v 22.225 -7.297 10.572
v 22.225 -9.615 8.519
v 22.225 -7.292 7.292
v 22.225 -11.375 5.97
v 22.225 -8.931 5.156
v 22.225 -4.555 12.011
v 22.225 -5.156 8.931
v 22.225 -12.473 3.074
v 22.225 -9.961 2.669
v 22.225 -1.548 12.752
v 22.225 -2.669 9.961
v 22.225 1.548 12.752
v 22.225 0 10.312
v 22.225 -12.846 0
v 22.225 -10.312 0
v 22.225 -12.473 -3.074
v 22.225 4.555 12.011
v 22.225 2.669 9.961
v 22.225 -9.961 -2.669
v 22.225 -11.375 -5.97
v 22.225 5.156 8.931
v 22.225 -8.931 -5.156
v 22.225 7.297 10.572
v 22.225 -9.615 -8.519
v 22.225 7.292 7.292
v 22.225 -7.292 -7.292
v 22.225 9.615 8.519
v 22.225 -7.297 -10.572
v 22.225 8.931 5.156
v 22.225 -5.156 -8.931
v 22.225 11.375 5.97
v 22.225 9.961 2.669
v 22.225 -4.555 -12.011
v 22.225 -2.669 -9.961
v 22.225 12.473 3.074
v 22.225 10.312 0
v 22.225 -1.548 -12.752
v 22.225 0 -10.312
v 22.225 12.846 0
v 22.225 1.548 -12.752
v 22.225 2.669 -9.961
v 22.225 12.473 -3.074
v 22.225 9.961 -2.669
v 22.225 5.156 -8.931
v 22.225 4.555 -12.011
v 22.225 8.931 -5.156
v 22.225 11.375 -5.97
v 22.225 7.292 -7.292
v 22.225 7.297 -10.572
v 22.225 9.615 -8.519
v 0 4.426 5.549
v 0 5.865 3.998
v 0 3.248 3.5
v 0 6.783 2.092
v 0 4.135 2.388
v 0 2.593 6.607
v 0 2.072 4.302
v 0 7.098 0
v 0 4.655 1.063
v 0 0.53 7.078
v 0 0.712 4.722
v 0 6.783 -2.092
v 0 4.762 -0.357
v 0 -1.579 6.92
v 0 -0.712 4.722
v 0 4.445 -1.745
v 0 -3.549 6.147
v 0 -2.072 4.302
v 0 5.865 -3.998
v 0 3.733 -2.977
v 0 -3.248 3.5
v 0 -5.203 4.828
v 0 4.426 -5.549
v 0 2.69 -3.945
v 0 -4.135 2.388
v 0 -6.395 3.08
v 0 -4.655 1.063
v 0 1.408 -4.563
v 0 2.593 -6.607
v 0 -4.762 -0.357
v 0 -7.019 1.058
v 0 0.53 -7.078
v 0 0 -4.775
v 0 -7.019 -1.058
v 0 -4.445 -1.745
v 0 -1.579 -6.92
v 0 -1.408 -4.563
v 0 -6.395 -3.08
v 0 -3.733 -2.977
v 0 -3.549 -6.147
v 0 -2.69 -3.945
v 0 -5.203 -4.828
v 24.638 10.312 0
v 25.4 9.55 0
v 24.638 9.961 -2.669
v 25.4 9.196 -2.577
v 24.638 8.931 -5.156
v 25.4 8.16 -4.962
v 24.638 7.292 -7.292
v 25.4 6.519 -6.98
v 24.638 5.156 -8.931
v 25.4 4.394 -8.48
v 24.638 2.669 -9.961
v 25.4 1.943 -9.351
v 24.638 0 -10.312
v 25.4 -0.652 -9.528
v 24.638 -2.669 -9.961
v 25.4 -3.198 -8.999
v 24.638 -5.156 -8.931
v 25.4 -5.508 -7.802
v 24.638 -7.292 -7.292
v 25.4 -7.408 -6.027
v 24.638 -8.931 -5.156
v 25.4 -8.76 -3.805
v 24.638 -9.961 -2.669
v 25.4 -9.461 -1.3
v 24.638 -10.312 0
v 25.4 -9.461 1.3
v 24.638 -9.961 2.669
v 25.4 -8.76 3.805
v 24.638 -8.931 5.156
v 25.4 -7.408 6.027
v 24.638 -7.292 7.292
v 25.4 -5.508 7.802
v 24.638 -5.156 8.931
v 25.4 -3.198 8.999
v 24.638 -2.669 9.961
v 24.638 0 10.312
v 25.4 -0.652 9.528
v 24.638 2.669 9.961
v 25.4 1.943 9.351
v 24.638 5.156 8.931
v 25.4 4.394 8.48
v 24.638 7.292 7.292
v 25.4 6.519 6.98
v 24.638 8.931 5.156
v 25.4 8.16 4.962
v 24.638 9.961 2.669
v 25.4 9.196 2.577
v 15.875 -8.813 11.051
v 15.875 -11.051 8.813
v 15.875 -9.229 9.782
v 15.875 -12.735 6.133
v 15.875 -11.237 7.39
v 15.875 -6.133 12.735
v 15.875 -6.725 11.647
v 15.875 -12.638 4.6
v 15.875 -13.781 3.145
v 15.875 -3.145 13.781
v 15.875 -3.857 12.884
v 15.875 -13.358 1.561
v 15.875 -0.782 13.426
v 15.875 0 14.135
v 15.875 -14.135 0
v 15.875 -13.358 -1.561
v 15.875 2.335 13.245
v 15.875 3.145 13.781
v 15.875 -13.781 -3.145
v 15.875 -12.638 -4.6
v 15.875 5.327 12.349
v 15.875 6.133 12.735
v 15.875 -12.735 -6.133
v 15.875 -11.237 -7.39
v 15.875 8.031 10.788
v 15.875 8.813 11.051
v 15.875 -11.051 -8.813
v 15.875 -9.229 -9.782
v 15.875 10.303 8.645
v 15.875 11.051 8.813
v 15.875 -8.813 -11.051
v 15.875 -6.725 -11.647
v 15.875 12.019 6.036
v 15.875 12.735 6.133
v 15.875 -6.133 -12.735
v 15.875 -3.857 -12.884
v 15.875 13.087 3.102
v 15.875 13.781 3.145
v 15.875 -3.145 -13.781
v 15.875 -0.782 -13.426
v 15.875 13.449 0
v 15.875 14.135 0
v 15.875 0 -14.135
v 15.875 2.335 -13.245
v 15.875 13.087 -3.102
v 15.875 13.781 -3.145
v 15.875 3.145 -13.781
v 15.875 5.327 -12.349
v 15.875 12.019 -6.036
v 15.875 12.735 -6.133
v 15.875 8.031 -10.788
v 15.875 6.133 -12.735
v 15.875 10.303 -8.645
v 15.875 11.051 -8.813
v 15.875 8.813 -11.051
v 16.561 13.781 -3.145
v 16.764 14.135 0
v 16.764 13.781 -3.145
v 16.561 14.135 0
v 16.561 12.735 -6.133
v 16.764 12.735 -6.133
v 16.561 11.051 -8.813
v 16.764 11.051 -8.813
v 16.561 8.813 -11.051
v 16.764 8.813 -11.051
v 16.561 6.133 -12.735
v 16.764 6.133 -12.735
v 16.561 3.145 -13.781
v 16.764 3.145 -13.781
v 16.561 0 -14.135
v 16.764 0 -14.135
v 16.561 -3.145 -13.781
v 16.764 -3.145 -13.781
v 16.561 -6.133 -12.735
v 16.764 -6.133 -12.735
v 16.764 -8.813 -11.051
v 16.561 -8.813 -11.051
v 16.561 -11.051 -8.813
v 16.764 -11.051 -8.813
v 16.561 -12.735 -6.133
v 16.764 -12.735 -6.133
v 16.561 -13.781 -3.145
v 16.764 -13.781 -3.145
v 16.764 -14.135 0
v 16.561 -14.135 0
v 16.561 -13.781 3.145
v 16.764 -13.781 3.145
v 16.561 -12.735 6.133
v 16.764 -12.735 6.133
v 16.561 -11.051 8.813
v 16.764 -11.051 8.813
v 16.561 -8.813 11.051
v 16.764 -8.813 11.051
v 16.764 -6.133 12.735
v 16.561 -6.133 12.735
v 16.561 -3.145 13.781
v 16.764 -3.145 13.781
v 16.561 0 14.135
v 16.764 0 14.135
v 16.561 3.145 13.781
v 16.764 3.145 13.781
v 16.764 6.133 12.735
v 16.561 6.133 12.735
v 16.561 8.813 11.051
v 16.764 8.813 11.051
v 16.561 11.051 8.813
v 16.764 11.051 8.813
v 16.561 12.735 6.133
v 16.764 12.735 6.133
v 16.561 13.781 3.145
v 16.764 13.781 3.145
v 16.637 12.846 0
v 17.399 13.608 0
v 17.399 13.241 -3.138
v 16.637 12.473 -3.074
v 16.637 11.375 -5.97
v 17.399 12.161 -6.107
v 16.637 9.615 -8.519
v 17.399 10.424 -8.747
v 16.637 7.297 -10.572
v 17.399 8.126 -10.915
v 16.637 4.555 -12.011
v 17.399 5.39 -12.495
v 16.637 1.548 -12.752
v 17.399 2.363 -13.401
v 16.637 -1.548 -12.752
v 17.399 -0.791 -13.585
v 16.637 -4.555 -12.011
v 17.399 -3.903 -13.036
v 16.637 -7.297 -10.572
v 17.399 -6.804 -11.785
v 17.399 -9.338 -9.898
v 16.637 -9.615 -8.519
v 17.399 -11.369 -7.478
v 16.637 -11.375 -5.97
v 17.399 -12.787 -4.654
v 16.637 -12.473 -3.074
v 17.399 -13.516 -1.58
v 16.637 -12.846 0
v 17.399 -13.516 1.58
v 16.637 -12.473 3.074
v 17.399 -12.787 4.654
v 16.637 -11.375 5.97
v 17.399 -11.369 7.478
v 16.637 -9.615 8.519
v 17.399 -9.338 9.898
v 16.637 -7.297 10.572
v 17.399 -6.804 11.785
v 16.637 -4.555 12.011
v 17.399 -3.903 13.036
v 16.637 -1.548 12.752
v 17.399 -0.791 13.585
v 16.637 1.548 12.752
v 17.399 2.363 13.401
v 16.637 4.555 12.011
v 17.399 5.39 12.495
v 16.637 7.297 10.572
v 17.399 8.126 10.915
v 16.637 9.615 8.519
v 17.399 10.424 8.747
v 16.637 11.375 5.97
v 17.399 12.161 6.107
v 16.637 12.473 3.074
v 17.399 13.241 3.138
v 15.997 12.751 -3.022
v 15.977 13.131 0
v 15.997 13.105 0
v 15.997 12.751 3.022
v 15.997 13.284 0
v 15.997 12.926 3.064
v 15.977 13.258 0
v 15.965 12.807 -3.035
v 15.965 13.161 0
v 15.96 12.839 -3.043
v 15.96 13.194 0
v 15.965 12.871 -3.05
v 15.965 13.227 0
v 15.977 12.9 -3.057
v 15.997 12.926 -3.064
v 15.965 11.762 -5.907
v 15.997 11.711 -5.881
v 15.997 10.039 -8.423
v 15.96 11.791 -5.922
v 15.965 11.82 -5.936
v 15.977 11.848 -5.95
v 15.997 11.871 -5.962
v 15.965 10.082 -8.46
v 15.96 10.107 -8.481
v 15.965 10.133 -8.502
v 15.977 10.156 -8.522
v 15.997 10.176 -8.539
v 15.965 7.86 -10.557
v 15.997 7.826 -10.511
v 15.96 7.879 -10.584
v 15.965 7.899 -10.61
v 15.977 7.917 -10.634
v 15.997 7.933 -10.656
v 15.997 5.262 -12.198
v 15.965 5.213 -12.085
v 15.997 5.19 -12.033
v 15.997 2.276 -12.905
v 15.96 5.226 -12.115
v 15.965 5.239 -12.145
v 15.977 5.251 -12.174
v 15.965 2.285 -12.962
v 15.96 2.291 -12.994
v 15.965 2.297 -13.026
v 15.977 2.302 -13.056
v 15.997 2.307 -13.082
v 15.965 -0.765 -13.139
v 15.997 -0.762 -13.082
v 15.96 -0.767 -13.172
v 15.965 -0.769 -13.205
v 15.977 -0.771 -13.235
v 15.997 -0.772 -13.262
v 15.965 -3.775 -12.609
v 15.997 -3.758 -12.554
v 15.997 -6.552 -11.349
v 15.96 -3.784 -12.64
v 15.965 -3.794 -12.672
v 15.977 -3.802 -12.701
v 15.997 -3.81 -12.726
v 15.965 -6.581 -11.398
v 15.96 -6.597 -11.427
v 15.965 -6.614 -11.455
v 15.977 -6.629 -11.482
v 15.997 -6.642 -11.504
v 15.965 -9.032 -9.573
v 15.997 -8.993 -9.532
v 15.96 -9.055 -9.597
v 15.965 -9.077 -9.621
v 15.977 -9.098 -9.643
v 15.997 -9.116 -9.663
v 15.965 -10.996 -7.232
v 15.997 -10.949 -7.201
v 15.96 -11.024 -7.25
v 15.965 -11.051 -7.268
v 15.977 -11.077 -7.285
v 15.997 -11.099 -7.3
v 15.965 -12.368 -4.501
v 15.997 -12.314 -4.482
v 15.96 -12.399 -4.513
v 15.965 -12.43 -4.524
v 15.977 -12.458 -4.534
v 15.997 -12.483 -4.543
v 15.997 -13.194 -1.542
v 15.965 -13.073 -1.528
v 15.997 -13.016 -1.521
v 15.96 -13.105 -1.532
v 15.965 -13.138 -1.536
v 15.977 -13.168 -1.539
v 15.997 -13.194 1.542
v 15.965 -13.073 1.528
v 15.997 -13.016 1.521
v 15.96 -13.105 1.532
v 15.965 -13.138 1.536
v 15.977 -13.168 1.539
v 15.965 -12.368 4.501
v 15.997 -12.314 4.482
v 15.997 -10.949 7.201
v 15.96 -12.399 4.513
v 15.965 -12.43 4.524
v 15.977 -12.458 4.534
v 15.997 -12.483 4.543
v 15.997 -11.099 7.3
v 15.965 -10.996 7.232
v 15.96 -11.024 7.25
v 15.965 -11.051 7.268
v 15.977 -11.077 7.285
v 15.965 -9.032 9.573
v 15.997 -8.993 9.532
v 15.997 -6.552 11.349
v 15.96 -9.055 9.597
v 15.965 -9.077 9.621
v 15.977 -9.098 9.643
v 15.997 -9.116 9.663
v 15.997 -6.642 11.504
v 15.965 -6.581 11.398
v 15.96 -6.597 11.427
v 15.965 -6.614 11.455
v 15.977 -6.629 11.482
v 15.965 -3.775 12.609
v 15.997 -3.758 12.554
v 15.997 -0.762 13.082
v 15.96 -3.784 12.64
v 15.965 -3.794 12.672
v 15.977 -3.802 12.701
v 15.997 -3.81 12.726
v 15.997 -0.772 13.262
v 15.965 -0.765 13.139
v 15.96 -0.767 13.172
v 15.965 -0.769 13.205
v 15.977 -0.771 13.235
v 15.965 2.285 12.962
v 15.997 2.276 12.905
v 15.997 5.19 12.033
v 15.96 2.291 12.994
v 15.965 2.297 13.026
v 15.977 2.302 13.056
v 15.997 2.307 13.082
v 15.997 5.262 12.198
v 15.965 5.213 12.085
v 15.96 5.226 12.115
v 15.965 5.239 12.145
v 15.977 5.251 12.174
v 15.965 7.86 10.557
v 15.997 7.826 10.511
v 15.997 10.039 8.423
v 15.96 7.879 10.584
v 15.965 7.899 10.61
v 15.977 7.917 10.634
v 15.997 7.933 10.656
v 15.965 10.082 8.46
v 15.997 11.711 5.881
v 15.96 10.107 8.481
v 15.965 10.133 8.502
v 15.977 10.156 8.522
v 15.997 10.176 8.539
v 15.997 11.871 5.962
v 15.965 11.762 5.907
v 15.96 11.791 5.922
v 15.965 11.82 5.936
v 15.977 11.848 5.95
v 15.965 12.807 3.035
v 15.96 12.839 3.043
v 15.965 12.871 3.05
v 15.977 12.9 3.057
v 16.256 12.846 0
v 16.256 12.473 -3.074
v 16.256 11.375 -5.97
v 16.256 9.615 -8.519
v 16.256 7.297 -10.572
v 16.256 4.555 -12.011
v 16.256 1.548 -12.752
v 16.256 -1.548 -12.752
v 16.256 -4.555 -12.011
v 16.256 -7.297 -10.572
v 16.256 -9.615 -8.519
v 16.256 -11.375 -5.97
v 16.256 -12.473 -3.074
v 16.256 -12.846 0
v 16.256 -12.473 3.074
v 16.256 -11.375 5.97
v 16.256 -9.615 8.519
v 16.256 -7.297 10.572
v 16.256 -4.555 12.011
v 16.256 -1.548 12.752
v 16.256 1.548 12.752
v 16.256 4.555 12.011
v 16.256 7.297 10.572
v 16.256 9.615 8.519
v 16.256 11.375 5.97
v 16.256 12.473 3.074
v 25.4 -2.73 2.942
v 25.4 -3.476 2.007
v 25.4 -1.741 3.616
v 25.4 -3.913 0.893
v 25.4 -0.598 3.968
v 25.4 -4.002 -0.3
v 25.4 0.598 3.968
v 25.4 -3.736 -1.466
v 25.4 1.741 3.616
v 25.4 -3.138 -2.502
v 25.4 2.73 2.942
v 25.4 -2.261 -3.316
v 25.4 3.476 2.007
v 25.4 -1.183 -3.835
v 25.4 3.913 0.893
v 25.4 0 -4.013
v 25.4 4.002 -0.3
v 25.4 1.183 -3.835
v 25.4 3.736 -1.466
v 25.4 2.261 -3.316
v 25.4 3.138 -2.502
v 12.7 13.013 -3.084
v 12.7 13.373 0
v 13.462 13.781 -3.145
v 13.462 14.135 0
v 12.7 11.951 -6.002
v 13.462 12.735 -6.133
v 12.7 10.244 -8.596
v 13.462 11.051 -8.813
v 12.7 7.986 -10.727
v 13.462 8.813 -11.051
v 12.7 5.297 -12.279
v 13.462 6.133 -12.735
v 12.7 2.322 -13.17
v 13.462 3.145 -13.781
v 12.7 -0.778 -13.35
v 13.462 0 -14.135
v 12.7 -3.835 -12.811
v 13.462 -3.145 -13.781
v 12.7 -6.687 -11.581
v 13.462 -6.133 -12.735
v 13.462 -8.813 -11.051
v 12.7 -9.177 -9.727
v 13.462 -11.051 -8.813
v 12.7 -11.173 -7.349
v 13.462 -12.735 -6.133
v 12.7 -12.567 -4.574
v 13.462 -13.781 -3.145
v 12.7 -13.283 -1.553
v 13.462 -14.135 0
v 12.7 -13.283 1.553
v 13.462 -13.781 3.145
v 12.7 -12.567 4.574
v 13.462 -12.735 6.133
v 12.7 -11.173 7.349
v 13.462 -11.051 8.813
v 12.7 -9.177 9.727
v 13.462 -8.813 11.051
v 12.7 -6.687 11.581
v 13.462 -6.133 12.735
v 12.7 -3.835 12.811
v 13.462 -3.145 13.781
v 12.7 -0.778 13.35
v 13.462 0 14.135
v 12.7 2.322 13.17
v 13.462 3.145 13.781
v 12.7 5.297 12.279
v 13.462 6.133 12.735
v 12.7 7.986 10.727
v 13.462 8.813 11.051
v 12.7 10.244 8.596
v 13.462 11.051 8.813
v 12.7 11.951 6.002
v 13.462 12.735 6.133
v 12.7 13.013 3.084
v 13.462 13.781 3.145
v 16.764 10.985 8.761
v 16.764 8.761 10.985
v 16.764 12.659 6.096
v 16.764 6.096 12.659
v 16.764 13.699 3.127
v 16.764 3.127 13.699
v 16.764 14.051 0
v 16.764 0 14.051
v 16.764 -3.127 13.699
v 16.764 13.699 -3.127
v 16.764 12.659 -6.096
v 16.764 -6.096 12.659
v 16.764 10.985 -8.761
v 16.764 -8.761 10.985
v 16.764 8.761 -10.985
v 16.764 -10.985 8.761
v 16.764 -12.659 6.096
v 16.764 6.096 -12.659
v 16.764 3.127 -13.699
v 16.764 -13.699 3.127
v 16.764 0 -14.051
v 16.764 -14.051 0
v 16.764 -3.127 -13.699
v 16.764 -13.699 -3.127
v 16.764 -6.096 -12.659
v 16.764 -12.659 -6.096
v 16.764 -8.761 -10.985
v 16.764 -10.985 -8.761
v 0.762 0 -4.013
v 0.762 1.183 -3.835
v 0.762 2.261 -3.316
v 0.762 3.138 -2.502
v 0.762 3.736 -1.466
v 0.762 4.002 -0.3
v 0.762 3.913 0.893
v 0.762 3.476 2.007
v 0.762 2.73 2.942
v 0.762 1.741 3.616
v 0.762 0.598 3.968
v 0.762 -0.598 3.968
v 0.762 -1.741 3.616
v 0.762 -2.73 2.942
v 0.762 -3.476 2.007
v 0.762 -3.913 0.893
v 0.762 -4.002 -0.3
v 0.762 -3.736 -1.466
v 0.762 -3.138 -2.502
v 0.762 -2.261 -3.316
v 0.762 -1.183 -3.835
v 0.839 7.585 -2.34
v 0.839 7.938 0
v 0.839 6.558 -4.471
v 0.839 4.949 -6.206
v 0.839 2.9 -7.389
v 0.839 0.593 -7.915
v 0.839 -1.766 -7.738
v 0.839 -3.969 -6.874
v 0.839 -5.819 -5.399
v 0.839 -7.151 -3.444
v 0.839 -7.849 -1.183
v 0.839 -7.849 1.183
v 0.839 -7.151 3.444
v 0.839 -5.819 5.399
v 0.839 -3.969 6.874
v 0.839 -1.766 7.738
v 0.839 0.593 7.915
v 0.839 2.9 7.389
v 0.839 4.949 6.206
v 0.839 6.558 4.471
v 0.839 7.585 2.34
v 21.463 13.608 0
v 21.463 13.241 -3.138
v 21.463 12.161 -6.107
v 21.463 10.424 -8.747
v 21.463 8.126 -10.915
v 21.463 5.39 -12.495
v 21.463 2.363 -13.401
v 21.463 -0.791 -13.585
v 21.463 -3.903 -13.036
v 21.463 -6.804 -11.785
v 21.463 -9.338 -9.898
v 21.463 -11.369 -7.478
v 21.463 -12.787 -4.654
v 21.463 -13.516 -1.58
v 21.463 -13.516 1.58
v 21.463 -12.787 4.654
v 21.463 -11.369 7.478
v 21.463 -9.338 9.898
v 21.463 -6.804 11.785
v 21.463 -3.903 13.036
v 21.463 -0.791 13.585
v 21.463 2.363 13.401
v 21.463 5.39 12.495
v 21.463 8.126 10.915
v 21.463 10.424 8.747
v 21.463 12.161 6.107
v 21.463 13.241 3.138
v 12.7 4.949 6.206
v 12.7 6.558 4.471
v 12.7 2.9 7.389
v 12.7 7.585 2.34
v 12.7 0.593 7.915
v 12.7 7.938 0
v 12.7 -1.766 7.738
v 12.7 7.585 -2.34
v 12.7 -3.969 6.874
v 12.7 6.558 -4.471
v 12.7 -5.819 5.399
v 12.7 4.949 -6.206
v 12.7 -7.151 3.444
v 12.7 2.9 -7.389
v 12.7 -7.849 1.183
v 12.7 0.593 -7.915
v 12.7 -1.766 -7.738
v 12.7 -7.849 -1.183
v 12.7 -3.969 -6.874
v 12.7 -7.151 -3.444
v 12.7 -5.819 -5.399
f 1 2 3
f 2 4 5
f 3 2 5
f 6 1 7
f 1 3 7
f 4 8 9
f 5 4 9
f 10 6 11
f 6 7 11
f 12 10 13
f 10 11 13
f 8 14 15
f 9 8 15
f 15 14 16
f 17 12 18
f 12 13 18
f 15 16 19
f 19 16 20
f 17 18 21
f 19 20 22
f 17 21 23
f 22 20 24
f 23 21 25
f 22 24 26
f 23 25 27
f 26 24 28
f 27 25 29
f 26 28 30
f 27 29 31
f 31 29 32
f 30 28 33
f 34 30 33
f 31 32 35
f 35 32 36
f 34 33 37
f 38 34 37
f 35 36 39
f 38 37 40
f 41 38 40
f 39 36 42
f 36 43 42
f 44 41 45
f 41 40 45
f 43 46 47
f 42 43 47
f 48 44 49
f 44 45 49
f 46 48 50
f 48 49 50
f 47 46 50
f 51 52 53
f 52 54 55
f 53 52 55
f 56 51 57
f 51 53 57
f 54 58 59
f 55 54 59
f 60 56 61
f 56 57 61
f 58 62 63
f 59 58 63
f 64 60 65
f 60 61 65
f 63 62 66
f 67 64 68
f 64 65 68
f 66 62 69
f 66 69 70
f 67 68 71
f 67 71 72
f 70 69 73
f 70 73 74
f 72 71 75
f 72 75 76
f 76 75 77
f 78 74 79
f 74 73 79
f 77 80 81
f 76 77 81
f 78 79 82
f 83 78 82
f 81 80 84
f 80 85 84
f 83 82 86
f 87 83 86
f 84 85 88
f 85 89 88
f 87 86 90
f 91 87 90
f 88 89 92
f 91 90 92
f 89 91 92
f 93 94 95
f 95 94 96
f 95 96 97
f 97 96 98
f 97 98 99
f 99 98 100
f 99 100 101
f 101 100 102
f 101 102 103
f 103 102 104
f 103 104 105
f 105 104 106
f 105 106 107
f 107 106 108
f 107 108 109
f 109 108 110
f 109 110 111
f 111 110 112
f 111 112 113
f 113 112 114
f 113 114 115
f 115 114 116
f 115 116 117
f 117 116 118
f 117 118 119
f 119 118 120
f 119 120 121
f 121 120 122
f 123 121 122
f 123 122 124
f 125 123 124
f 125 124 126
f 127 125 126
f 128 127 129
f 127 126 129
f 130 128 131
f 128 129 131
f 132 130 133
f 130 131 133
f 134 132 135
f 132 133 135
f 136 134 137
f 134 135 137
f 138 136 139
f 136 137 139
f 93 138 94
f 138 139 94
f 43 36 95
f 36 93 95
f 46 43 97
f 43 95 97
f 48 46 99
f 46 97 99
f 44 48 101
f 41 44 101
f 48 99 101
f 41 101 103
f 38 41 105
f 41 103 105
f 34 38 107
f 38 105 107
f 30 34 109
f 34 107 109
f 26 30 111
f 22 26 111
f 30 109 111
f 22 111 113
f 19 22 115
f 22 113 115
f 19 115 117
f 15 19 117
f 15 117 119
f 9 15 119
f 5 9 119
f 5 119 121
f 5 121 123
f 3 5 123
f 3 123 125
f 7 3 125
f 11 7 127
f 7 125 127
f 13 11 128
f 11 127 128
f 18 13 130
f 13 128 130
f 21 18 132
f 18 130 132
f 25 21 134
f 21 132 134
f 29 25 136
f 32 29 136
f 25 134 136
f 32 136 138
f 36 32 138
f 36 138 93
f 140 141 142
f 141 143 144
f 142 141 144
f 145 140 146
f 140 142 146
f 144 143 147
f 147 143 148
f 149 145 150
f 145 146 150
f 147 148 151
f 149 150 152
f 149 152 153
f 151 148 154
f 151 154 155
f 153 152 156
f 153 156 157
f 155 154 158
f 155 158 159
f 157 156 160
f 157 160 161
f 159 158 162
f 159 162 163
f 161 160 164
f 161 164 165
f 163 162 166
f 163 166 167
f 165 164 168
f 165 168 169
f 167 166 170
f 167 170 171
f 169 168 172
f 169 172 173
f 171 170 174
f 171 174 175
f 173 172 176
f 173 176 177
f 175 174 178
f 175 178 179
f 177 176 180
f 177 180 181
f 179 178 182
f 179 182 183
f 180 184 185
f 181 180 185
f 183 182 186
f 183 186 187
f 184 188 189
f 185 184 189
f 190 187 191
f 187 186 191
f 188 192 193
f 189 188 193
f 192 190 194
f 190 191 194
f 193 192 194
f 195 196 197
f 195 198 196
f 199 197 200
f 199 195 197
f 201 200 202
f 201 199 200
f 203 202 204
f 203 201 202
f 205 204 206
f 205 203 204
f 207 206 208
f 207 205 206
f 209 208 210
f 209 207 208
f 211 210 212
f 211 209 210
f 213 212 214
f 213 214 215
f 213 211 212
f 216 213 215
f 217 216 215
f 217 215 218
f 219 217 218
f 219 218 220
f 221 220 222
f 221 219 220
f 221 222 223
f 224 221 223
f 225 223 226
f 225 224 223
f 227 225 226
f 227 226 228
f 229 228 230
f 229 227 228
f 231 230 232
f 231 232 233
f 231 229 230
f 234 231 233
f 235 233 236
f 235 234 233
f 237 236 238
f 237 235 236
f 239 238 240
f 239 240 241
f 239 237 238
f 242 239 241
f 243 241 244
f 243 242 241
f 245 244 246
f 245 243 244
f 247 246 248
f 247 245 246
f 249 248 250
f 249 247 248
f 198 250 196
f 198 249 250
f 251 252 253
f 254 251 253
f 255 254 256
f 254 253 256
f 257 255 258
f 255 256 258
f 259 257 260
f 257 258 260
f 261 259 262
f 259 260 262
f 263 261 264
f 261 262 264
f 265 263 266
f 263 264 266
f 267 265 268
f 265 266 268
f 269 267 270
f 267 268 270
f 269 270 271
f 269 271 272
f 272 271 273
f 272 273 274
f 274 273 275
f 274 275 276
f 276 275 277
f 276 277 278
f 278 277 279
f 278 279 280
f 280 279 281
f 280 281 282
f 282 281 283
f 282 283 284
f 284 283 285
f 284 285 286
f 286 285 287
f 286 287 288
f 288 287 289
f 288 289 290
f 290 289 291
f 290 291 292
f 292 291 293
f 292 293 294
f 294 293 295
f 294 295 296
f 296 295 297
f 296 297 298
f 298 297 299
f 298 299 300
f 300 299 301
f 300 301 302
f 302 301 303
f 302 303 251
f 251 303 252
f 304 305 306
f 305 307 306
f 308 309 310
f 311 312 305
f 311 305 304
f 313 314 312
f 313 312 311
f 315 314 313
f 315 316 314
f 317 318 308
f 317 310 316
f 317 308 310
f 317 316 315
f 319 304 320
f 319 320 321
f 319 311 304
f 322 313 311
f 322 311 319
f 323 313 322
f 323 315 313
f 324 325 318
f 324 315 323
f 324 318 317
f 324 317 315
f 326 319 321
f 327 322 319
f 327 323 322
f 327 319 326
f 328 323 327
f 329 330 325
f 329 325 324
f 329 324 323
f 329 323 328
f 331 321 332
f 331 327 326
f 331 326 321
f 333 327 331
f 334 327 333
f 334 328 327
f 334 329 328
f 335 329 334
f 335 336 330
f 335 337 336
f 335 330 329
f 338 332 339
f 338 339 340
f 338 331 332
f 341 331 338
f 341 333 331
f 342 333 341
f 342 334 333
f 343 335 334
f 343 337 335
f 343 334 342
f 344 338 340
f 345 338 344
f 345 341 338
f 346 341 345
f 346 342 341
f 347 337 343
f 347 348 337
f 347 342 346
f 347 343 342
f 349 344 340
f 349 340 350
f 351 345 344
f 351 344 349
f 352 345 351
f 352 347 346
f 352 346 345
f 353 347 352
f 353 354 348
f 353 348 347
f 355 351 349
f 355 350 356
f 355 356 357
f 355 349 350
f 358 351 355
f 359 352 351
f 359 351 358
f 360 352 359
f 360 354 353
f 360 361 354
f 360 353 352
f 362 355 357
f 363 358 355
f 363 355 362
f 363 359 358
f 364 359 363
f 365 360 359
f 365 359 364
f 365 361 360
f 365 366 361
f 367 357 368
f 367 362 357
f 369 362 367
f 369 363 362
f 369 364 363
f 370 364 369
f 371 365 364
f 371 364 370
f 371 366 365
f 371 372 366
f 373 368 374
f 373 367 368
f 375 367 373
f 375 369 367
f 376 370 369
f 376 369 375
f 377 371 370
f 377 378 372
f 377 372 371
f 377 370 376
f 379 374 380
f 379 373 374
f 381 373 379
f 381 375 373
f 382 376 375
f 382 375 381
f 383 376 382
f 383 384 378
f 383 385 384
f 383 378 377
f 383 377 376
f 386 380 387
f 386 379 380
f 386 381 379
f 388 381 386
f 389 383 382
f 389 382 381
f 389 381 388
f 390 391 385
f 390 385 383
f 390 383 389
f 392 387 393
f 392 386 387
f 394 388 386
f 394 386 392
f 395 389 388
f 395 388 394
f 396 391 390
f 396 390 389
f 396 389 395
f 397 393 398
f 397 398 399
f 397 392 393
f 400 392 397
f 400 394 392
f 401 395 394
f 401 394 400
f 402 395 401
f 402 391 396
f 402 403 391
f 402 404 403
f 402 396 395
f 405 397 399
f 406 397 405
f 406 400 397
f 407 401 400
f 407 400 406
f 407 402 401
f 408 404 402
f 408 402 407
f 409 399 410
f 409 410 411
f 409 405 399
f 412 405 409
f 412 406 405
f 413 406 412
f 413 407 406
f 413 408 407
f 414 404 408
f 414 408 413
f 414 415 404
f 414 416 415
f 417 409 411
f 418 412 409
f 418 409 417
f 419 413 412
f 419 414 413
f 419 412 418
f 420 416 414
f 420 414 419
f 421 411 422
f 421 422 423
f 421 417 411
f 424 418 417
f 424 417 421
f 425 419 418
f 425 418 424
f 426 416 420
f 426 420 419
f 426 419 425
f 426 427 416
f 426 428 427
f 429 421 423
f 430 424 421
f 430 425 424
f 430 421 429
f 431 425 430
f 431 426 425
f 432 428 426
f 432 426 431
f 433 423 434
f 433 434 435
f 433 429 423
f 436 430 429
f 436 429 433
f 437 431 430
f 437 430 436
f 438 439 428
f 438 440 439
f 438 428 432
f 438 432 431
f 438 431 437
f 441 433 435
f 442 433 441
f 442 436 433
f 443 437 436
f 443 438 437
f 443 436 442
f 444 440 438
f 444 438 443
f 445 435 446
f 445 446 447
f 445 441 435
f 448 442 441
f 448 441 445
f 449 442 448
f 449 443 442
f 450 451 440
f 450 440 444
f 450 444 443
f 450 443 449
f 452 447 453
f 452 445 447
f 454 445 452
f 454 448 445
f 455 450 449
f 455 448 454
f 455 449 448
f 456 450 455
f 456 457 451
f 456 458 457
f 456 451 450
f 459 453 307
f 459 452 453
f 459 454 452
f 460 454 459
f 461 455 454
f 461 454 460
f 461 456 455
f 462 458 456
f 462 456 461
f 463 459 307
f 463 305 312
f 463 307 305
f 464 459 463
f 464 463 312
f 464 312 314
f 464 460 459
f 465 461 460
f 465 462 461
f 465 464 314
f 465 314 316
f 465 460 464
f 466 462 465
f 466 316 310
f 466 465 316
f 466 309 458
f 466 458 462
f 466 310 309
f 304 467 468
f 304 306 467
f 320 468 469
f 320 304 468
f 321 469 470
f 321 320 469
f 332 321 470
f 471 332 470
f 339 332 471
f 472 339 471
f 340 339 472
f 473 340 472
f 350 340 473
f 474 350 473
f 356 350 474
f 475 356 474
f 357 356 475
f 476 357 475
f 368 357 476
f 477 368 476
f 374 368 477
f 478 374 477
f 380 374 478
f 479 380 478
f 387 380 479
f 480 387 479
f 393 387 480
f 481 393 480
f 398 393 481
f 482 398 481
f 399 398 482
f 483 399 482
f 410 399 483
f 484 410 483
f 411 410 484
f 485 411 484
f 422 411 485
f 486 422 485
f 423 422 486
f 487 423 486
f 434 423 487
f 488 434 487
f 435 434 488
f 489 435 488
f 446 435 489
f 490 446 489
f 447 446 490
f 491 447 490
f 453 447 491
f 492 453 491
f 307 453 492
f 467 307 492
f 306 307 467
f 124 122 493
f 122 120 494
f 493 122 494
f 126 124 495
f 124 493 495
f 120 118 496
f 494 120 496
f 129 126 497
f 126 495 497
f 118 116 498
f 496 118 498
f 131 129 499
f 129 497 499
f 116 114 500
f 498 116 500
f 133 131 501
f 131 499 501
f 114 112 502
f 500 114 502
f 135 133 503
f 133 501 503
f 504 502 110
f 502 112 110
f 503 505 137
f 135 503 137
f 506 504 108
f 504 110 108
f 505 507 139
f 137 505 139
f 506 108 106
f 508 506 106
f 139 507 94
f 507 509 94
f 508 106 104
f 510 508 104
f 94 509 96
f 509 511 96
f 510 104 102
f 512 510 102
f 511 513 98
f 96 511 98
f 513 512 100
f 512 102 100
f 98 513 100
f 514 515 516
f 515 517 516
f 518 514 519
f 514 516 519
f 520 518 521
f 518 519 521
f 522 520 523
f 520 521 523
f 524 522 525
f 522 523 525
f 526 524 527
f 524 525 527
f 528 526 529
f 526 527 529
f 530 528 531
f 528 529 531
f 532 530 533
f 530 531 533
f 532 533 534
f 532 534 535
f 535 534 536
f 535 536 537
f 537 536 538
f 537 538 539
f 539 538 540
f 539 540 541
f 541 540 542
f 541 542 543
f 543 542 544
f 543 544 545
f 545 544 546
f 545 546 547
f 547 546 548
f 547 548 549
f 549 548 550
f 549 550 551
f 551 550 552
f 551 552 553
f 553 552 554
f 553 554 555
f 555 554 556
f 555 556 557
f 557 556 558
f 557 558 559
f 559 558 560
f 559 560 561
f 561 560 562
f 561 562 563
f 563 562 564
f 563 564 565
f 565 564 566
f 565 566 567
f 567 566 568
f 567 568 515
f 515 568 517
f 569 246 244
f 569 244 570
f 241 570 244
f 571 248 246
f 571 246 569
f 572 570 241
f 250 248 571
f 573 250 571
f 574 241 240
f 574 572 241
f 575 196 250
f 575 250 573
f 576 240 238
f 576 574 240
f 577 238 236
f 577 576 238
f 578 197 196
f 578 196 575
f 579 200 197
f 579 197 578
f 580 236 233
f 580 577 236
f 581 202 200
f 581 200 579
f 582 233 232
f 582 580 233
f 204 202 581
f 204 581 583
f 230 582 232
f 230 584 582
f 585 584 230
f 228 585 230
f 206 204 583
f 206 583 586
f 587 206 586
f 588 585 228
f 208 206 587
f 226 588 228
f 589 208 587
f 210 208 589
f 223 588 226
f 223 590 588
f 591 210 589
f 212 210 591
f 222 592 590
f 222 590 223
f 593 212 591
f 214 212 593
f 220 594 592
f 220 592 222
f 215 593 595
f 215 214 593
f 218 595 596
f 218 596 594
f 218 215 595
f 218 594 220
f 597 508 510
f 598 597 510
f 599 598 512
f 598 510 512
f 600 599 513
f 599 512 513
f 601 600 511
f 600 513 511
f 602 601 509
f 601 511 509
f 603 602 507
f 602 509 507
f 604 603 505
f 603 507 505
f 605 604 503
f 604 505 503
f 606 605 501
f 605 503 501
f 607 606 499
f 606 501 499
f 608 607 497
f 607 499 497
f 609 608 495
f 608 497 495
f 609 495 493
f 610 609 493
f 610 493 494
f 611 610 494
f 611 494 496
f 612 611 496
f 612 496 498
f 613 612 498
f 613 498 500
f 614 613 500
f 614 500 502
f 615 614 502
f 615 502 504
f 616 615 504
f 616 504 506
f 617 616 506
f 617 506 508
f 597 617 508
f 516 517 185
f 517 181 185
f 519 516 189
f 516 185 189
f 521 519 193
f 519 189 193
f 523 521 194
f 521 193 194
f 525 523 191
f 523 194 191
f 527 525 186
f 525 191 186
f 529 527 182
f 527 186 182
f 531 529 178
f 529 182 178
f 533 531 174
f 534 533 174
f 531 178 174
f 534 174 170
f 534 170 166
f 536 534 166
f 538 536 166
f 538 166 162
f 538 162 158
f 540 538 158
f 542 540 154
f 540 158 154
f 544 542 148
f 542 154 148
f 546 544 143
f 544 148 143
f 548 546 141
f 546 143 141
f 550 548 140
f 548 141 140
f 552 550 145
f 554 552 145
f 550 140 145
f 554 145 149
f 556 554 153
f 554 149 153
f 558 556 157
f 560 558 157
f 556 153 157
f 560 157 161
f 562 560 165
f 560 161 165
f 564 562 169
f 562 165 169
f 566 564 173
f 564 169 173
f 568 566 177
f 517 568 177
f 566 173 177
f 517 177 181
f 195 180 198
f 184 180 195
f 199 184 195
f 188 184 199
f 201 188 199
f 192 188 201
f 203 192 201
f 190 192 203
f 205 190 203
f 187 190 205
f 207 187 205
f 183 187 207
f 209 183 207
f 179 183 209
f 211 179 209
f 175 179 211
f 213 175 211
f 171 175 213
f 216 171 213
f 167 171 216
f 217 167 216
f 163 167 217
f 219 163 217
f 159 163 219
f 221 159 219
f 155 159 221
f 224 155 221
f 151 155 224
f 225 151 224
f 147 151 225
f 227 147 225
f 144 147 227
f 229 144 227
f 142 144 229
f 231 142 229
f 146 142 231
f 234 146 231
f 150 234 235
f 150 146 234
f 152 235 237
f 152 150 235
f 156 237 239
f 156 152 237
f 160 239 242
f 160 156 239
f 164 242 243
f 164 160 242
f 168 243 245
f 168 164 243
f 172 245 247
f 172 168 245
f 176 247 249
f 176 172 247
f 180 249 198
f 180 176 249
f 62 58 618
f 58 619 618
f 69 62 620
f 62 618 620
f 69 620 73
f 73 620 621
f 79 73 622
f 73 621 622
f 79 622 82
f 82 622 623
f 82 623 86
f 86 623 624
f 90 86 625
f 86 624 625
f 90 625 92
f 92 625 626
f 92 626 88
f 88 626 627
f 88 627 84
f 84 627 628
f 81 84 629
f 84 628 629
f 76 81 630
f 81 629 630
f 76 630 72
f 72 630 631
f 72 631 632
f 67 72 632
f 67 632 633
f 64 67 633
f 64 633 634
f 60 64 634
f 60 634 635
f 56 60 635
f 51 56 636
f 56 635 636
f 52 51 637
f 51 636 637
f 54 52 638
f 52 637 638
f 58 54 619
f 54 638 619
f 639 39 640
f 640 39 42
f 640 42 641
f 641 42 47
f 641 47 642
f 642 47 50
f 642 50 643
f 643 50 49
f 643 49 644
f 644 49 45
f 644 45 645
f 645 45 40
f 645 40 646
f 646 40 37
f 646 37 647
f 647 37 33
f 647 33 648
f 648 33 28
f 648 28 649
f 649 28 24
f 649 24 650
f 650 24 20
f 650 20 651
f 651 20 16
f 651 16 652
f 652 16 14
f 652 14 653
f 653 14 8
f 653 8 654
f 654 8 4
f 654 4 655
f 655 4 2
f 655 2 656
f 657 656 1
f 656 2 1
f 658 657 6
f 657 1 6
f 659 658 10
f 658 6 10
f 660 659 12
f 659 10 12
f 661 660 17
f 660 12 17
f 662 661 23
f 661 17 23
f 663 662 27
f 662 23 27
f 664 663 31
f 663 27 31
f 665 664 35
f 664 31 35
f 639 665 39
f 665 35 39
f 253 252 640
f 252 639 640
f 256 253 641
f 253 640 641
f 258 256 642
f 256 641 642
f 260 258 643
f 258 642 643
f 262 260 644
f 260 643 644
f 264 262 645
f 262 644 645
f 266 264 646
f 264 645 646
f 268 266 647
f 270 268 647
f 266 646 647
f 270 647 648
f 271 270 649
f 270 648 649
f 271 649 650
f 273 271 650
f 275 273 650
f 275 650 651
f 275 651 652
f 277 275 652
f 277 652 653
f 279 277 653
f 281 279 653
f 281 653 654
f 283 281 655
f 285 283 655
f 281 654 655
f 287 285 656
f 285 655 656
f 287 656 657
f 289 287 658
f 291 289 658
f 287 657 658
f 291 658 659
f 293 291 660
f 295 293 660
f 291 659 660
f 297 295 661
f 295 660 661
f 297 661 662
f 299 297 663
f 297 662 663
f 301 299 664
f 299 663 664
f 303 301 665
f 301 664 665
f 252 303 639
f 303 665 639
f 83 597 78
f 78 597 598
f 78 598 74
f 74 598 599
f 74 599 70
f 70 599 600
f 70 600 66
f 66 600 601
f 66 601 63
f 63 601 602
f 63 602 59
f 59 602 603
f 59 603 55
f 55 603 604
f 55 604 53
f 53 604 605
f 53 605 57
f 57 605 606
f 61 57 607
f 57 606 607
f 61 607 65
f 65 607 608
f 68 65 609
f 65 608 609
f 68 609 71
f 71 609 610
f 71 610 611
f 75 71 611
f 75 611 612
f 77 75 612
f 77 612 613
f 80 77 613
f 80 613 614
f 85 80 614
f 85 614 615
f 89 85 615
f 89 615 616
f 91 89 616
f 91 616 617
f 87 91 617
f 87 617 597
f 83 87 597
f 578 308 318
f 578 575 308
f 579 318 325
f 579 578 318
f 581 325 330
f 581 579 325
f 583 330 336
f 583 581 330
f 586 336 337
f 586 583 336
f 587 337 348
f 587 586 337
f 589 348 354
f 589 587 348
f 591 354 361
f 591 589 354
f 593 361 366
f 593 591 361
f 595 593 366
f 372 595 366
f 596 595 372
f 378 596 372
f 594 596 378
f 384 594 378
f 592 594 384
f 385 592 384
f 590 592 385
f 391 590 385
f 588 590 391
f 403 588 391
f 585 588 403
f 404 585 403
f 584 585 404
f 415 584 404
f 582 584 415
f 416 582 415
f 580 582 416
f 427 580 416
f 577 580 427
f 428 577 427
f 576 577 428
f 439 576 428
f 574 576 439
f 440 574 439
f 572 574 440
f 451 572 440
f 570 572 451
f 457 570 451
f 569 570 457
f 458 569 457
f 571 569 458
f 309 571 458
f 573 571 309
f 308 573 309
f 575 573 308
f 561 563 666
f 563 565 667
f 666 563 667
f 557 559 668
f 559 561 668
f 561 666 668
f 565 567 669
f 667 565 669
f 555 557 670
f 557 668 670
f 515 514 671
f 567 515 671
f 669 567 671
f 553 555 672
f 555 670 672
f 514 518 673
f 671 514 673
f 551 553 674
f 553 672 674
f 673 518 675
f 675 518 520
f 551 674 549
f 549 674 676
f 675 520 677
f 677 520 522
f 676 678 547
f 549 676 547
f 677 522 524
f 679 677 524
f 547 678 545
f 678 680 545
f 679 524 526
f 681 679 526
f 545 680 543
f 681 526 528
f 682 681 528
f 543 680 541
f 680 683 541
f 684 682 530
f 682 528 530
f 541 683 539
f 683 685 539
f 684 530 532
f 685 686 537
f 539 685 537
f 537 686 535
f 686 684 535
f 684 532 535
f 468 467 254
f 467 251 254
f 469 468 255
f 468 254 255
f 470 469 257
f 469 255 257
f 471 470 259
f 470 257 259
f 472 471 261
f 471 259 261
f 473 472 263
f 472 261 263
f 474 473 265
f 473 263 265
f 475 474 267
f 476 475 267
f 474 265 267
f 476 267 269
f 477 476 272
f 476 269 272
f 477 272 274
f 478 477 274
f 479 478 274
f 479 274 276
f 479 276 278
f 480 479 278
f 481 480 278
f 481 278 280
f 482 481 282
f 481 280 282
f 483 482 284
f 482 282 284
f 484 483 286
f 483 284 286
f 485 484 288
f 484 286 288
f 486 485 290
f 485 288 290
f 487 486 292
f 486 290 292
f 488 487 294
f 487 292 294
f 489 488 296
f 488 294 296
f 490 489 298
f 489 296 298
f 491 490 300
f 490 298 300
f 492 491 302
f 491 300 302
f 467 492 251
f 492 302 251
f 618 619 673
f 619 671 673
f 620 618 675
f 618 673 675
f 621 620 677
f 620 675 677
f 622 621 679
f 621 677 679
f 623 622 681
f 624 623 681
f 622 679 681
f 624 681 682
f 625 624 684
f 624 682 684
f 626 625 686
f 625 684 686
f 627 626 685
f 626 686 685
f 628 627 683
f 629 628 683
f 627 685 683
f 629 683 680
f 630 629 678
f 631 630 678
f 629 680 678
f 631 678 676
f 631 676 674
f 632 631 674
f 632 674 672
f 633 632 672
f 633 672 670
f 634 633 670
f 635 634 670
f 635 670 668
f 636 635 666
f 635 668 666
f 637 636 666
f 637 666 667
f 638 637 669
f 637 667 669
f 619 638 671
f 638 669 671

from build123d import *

# Parameters (mm, degrees)
HOLE1_D           = 8.0264
HOLE1_CSINK_D     = 9.5504
HOLE1_CSINK_ANGLE = 90


with BuildPart() as part:
    # Sketch1 → Revolve1 (revolve)
    with BuildSketch(Plane.XY):
        Polygon((0, 0), (0, 7.09803), (0.83947, 7.9375), (12.7, 7.9375), (12.7, 0), align=None)
    revolve(axis=Axis((12.7, 0, 0), (-1, 0, 0)))

    # Sketch2 → Revolve2 (revolve)
    with BuildSketch(Plane.XY):
        Polygon((12.7, 0), (12.7, 13.3731), (13.462, 14.1351), (15.875, 14.1351), (15.875, 12.84605), (16.637, 12.84605), (17.399, 13.60805), (21.463, 13.60805), (22.225, 12.84605), (22.225, 0), align=None)
    revolve(axis=Axis((22.225, 0, 0), (-1, 0, 0)))

    # Sketch3 → Revolve3 (revolve)
    with BuildSketch(Plane.XY):
        Polygon((22.225, 0), (22.225, 10.3124), (24.638, 10.3124), (25.4, 9.5504), (25.4, 0), align=None)
    revolve(axis=Axis((25.4, 0, 0), (-1, 0, 0)))

    # Hole1 (through all)
    with Locations(Plane.ZY):
        with Locations((0, 0)):
            CounterSinkHole(HOLE1_D / 2, HOLE1_CSINK_D / 2, counter_sink_angle=HOLE1_CSINK_ANGLE)

    # Sketch6 → Revolve4 (revolve)
    with BuildSketch(Plane.XY):
        with BuildLine():
            Line((15.875, 12.59205), (16.637, 12.59205))
            Line((16.637, 12.59205), (16.637, 12.84605))
            Line((16.637, 12.84605), (16.256, 12.84605))
            Line((16.256, 12.84605), (15.997487194, 13.104562806))
            ThreePointArc((15.997487194, 13.104562806), (15.960289755, 13.194365367), (15.997487194, 13.284167928))
            Line((15.997487194, 13.284167928), (16.76425107, 14.050931804))
            Line((16.76425107, 14.050931804), (16.76425107, 14.1351))
            Line((16.76425107, 14.1351), (16.56105107, 14.1351))
            Line((16.56105107, 14.1351), (15.875, 13.44904893))
            Line((15.875, 13.44904893), (15.875, 12.59205))
        make_face()
    revolve(axis=Axis((16.637, 0, 0), (-1, 0, 0)))


solid = part.part
